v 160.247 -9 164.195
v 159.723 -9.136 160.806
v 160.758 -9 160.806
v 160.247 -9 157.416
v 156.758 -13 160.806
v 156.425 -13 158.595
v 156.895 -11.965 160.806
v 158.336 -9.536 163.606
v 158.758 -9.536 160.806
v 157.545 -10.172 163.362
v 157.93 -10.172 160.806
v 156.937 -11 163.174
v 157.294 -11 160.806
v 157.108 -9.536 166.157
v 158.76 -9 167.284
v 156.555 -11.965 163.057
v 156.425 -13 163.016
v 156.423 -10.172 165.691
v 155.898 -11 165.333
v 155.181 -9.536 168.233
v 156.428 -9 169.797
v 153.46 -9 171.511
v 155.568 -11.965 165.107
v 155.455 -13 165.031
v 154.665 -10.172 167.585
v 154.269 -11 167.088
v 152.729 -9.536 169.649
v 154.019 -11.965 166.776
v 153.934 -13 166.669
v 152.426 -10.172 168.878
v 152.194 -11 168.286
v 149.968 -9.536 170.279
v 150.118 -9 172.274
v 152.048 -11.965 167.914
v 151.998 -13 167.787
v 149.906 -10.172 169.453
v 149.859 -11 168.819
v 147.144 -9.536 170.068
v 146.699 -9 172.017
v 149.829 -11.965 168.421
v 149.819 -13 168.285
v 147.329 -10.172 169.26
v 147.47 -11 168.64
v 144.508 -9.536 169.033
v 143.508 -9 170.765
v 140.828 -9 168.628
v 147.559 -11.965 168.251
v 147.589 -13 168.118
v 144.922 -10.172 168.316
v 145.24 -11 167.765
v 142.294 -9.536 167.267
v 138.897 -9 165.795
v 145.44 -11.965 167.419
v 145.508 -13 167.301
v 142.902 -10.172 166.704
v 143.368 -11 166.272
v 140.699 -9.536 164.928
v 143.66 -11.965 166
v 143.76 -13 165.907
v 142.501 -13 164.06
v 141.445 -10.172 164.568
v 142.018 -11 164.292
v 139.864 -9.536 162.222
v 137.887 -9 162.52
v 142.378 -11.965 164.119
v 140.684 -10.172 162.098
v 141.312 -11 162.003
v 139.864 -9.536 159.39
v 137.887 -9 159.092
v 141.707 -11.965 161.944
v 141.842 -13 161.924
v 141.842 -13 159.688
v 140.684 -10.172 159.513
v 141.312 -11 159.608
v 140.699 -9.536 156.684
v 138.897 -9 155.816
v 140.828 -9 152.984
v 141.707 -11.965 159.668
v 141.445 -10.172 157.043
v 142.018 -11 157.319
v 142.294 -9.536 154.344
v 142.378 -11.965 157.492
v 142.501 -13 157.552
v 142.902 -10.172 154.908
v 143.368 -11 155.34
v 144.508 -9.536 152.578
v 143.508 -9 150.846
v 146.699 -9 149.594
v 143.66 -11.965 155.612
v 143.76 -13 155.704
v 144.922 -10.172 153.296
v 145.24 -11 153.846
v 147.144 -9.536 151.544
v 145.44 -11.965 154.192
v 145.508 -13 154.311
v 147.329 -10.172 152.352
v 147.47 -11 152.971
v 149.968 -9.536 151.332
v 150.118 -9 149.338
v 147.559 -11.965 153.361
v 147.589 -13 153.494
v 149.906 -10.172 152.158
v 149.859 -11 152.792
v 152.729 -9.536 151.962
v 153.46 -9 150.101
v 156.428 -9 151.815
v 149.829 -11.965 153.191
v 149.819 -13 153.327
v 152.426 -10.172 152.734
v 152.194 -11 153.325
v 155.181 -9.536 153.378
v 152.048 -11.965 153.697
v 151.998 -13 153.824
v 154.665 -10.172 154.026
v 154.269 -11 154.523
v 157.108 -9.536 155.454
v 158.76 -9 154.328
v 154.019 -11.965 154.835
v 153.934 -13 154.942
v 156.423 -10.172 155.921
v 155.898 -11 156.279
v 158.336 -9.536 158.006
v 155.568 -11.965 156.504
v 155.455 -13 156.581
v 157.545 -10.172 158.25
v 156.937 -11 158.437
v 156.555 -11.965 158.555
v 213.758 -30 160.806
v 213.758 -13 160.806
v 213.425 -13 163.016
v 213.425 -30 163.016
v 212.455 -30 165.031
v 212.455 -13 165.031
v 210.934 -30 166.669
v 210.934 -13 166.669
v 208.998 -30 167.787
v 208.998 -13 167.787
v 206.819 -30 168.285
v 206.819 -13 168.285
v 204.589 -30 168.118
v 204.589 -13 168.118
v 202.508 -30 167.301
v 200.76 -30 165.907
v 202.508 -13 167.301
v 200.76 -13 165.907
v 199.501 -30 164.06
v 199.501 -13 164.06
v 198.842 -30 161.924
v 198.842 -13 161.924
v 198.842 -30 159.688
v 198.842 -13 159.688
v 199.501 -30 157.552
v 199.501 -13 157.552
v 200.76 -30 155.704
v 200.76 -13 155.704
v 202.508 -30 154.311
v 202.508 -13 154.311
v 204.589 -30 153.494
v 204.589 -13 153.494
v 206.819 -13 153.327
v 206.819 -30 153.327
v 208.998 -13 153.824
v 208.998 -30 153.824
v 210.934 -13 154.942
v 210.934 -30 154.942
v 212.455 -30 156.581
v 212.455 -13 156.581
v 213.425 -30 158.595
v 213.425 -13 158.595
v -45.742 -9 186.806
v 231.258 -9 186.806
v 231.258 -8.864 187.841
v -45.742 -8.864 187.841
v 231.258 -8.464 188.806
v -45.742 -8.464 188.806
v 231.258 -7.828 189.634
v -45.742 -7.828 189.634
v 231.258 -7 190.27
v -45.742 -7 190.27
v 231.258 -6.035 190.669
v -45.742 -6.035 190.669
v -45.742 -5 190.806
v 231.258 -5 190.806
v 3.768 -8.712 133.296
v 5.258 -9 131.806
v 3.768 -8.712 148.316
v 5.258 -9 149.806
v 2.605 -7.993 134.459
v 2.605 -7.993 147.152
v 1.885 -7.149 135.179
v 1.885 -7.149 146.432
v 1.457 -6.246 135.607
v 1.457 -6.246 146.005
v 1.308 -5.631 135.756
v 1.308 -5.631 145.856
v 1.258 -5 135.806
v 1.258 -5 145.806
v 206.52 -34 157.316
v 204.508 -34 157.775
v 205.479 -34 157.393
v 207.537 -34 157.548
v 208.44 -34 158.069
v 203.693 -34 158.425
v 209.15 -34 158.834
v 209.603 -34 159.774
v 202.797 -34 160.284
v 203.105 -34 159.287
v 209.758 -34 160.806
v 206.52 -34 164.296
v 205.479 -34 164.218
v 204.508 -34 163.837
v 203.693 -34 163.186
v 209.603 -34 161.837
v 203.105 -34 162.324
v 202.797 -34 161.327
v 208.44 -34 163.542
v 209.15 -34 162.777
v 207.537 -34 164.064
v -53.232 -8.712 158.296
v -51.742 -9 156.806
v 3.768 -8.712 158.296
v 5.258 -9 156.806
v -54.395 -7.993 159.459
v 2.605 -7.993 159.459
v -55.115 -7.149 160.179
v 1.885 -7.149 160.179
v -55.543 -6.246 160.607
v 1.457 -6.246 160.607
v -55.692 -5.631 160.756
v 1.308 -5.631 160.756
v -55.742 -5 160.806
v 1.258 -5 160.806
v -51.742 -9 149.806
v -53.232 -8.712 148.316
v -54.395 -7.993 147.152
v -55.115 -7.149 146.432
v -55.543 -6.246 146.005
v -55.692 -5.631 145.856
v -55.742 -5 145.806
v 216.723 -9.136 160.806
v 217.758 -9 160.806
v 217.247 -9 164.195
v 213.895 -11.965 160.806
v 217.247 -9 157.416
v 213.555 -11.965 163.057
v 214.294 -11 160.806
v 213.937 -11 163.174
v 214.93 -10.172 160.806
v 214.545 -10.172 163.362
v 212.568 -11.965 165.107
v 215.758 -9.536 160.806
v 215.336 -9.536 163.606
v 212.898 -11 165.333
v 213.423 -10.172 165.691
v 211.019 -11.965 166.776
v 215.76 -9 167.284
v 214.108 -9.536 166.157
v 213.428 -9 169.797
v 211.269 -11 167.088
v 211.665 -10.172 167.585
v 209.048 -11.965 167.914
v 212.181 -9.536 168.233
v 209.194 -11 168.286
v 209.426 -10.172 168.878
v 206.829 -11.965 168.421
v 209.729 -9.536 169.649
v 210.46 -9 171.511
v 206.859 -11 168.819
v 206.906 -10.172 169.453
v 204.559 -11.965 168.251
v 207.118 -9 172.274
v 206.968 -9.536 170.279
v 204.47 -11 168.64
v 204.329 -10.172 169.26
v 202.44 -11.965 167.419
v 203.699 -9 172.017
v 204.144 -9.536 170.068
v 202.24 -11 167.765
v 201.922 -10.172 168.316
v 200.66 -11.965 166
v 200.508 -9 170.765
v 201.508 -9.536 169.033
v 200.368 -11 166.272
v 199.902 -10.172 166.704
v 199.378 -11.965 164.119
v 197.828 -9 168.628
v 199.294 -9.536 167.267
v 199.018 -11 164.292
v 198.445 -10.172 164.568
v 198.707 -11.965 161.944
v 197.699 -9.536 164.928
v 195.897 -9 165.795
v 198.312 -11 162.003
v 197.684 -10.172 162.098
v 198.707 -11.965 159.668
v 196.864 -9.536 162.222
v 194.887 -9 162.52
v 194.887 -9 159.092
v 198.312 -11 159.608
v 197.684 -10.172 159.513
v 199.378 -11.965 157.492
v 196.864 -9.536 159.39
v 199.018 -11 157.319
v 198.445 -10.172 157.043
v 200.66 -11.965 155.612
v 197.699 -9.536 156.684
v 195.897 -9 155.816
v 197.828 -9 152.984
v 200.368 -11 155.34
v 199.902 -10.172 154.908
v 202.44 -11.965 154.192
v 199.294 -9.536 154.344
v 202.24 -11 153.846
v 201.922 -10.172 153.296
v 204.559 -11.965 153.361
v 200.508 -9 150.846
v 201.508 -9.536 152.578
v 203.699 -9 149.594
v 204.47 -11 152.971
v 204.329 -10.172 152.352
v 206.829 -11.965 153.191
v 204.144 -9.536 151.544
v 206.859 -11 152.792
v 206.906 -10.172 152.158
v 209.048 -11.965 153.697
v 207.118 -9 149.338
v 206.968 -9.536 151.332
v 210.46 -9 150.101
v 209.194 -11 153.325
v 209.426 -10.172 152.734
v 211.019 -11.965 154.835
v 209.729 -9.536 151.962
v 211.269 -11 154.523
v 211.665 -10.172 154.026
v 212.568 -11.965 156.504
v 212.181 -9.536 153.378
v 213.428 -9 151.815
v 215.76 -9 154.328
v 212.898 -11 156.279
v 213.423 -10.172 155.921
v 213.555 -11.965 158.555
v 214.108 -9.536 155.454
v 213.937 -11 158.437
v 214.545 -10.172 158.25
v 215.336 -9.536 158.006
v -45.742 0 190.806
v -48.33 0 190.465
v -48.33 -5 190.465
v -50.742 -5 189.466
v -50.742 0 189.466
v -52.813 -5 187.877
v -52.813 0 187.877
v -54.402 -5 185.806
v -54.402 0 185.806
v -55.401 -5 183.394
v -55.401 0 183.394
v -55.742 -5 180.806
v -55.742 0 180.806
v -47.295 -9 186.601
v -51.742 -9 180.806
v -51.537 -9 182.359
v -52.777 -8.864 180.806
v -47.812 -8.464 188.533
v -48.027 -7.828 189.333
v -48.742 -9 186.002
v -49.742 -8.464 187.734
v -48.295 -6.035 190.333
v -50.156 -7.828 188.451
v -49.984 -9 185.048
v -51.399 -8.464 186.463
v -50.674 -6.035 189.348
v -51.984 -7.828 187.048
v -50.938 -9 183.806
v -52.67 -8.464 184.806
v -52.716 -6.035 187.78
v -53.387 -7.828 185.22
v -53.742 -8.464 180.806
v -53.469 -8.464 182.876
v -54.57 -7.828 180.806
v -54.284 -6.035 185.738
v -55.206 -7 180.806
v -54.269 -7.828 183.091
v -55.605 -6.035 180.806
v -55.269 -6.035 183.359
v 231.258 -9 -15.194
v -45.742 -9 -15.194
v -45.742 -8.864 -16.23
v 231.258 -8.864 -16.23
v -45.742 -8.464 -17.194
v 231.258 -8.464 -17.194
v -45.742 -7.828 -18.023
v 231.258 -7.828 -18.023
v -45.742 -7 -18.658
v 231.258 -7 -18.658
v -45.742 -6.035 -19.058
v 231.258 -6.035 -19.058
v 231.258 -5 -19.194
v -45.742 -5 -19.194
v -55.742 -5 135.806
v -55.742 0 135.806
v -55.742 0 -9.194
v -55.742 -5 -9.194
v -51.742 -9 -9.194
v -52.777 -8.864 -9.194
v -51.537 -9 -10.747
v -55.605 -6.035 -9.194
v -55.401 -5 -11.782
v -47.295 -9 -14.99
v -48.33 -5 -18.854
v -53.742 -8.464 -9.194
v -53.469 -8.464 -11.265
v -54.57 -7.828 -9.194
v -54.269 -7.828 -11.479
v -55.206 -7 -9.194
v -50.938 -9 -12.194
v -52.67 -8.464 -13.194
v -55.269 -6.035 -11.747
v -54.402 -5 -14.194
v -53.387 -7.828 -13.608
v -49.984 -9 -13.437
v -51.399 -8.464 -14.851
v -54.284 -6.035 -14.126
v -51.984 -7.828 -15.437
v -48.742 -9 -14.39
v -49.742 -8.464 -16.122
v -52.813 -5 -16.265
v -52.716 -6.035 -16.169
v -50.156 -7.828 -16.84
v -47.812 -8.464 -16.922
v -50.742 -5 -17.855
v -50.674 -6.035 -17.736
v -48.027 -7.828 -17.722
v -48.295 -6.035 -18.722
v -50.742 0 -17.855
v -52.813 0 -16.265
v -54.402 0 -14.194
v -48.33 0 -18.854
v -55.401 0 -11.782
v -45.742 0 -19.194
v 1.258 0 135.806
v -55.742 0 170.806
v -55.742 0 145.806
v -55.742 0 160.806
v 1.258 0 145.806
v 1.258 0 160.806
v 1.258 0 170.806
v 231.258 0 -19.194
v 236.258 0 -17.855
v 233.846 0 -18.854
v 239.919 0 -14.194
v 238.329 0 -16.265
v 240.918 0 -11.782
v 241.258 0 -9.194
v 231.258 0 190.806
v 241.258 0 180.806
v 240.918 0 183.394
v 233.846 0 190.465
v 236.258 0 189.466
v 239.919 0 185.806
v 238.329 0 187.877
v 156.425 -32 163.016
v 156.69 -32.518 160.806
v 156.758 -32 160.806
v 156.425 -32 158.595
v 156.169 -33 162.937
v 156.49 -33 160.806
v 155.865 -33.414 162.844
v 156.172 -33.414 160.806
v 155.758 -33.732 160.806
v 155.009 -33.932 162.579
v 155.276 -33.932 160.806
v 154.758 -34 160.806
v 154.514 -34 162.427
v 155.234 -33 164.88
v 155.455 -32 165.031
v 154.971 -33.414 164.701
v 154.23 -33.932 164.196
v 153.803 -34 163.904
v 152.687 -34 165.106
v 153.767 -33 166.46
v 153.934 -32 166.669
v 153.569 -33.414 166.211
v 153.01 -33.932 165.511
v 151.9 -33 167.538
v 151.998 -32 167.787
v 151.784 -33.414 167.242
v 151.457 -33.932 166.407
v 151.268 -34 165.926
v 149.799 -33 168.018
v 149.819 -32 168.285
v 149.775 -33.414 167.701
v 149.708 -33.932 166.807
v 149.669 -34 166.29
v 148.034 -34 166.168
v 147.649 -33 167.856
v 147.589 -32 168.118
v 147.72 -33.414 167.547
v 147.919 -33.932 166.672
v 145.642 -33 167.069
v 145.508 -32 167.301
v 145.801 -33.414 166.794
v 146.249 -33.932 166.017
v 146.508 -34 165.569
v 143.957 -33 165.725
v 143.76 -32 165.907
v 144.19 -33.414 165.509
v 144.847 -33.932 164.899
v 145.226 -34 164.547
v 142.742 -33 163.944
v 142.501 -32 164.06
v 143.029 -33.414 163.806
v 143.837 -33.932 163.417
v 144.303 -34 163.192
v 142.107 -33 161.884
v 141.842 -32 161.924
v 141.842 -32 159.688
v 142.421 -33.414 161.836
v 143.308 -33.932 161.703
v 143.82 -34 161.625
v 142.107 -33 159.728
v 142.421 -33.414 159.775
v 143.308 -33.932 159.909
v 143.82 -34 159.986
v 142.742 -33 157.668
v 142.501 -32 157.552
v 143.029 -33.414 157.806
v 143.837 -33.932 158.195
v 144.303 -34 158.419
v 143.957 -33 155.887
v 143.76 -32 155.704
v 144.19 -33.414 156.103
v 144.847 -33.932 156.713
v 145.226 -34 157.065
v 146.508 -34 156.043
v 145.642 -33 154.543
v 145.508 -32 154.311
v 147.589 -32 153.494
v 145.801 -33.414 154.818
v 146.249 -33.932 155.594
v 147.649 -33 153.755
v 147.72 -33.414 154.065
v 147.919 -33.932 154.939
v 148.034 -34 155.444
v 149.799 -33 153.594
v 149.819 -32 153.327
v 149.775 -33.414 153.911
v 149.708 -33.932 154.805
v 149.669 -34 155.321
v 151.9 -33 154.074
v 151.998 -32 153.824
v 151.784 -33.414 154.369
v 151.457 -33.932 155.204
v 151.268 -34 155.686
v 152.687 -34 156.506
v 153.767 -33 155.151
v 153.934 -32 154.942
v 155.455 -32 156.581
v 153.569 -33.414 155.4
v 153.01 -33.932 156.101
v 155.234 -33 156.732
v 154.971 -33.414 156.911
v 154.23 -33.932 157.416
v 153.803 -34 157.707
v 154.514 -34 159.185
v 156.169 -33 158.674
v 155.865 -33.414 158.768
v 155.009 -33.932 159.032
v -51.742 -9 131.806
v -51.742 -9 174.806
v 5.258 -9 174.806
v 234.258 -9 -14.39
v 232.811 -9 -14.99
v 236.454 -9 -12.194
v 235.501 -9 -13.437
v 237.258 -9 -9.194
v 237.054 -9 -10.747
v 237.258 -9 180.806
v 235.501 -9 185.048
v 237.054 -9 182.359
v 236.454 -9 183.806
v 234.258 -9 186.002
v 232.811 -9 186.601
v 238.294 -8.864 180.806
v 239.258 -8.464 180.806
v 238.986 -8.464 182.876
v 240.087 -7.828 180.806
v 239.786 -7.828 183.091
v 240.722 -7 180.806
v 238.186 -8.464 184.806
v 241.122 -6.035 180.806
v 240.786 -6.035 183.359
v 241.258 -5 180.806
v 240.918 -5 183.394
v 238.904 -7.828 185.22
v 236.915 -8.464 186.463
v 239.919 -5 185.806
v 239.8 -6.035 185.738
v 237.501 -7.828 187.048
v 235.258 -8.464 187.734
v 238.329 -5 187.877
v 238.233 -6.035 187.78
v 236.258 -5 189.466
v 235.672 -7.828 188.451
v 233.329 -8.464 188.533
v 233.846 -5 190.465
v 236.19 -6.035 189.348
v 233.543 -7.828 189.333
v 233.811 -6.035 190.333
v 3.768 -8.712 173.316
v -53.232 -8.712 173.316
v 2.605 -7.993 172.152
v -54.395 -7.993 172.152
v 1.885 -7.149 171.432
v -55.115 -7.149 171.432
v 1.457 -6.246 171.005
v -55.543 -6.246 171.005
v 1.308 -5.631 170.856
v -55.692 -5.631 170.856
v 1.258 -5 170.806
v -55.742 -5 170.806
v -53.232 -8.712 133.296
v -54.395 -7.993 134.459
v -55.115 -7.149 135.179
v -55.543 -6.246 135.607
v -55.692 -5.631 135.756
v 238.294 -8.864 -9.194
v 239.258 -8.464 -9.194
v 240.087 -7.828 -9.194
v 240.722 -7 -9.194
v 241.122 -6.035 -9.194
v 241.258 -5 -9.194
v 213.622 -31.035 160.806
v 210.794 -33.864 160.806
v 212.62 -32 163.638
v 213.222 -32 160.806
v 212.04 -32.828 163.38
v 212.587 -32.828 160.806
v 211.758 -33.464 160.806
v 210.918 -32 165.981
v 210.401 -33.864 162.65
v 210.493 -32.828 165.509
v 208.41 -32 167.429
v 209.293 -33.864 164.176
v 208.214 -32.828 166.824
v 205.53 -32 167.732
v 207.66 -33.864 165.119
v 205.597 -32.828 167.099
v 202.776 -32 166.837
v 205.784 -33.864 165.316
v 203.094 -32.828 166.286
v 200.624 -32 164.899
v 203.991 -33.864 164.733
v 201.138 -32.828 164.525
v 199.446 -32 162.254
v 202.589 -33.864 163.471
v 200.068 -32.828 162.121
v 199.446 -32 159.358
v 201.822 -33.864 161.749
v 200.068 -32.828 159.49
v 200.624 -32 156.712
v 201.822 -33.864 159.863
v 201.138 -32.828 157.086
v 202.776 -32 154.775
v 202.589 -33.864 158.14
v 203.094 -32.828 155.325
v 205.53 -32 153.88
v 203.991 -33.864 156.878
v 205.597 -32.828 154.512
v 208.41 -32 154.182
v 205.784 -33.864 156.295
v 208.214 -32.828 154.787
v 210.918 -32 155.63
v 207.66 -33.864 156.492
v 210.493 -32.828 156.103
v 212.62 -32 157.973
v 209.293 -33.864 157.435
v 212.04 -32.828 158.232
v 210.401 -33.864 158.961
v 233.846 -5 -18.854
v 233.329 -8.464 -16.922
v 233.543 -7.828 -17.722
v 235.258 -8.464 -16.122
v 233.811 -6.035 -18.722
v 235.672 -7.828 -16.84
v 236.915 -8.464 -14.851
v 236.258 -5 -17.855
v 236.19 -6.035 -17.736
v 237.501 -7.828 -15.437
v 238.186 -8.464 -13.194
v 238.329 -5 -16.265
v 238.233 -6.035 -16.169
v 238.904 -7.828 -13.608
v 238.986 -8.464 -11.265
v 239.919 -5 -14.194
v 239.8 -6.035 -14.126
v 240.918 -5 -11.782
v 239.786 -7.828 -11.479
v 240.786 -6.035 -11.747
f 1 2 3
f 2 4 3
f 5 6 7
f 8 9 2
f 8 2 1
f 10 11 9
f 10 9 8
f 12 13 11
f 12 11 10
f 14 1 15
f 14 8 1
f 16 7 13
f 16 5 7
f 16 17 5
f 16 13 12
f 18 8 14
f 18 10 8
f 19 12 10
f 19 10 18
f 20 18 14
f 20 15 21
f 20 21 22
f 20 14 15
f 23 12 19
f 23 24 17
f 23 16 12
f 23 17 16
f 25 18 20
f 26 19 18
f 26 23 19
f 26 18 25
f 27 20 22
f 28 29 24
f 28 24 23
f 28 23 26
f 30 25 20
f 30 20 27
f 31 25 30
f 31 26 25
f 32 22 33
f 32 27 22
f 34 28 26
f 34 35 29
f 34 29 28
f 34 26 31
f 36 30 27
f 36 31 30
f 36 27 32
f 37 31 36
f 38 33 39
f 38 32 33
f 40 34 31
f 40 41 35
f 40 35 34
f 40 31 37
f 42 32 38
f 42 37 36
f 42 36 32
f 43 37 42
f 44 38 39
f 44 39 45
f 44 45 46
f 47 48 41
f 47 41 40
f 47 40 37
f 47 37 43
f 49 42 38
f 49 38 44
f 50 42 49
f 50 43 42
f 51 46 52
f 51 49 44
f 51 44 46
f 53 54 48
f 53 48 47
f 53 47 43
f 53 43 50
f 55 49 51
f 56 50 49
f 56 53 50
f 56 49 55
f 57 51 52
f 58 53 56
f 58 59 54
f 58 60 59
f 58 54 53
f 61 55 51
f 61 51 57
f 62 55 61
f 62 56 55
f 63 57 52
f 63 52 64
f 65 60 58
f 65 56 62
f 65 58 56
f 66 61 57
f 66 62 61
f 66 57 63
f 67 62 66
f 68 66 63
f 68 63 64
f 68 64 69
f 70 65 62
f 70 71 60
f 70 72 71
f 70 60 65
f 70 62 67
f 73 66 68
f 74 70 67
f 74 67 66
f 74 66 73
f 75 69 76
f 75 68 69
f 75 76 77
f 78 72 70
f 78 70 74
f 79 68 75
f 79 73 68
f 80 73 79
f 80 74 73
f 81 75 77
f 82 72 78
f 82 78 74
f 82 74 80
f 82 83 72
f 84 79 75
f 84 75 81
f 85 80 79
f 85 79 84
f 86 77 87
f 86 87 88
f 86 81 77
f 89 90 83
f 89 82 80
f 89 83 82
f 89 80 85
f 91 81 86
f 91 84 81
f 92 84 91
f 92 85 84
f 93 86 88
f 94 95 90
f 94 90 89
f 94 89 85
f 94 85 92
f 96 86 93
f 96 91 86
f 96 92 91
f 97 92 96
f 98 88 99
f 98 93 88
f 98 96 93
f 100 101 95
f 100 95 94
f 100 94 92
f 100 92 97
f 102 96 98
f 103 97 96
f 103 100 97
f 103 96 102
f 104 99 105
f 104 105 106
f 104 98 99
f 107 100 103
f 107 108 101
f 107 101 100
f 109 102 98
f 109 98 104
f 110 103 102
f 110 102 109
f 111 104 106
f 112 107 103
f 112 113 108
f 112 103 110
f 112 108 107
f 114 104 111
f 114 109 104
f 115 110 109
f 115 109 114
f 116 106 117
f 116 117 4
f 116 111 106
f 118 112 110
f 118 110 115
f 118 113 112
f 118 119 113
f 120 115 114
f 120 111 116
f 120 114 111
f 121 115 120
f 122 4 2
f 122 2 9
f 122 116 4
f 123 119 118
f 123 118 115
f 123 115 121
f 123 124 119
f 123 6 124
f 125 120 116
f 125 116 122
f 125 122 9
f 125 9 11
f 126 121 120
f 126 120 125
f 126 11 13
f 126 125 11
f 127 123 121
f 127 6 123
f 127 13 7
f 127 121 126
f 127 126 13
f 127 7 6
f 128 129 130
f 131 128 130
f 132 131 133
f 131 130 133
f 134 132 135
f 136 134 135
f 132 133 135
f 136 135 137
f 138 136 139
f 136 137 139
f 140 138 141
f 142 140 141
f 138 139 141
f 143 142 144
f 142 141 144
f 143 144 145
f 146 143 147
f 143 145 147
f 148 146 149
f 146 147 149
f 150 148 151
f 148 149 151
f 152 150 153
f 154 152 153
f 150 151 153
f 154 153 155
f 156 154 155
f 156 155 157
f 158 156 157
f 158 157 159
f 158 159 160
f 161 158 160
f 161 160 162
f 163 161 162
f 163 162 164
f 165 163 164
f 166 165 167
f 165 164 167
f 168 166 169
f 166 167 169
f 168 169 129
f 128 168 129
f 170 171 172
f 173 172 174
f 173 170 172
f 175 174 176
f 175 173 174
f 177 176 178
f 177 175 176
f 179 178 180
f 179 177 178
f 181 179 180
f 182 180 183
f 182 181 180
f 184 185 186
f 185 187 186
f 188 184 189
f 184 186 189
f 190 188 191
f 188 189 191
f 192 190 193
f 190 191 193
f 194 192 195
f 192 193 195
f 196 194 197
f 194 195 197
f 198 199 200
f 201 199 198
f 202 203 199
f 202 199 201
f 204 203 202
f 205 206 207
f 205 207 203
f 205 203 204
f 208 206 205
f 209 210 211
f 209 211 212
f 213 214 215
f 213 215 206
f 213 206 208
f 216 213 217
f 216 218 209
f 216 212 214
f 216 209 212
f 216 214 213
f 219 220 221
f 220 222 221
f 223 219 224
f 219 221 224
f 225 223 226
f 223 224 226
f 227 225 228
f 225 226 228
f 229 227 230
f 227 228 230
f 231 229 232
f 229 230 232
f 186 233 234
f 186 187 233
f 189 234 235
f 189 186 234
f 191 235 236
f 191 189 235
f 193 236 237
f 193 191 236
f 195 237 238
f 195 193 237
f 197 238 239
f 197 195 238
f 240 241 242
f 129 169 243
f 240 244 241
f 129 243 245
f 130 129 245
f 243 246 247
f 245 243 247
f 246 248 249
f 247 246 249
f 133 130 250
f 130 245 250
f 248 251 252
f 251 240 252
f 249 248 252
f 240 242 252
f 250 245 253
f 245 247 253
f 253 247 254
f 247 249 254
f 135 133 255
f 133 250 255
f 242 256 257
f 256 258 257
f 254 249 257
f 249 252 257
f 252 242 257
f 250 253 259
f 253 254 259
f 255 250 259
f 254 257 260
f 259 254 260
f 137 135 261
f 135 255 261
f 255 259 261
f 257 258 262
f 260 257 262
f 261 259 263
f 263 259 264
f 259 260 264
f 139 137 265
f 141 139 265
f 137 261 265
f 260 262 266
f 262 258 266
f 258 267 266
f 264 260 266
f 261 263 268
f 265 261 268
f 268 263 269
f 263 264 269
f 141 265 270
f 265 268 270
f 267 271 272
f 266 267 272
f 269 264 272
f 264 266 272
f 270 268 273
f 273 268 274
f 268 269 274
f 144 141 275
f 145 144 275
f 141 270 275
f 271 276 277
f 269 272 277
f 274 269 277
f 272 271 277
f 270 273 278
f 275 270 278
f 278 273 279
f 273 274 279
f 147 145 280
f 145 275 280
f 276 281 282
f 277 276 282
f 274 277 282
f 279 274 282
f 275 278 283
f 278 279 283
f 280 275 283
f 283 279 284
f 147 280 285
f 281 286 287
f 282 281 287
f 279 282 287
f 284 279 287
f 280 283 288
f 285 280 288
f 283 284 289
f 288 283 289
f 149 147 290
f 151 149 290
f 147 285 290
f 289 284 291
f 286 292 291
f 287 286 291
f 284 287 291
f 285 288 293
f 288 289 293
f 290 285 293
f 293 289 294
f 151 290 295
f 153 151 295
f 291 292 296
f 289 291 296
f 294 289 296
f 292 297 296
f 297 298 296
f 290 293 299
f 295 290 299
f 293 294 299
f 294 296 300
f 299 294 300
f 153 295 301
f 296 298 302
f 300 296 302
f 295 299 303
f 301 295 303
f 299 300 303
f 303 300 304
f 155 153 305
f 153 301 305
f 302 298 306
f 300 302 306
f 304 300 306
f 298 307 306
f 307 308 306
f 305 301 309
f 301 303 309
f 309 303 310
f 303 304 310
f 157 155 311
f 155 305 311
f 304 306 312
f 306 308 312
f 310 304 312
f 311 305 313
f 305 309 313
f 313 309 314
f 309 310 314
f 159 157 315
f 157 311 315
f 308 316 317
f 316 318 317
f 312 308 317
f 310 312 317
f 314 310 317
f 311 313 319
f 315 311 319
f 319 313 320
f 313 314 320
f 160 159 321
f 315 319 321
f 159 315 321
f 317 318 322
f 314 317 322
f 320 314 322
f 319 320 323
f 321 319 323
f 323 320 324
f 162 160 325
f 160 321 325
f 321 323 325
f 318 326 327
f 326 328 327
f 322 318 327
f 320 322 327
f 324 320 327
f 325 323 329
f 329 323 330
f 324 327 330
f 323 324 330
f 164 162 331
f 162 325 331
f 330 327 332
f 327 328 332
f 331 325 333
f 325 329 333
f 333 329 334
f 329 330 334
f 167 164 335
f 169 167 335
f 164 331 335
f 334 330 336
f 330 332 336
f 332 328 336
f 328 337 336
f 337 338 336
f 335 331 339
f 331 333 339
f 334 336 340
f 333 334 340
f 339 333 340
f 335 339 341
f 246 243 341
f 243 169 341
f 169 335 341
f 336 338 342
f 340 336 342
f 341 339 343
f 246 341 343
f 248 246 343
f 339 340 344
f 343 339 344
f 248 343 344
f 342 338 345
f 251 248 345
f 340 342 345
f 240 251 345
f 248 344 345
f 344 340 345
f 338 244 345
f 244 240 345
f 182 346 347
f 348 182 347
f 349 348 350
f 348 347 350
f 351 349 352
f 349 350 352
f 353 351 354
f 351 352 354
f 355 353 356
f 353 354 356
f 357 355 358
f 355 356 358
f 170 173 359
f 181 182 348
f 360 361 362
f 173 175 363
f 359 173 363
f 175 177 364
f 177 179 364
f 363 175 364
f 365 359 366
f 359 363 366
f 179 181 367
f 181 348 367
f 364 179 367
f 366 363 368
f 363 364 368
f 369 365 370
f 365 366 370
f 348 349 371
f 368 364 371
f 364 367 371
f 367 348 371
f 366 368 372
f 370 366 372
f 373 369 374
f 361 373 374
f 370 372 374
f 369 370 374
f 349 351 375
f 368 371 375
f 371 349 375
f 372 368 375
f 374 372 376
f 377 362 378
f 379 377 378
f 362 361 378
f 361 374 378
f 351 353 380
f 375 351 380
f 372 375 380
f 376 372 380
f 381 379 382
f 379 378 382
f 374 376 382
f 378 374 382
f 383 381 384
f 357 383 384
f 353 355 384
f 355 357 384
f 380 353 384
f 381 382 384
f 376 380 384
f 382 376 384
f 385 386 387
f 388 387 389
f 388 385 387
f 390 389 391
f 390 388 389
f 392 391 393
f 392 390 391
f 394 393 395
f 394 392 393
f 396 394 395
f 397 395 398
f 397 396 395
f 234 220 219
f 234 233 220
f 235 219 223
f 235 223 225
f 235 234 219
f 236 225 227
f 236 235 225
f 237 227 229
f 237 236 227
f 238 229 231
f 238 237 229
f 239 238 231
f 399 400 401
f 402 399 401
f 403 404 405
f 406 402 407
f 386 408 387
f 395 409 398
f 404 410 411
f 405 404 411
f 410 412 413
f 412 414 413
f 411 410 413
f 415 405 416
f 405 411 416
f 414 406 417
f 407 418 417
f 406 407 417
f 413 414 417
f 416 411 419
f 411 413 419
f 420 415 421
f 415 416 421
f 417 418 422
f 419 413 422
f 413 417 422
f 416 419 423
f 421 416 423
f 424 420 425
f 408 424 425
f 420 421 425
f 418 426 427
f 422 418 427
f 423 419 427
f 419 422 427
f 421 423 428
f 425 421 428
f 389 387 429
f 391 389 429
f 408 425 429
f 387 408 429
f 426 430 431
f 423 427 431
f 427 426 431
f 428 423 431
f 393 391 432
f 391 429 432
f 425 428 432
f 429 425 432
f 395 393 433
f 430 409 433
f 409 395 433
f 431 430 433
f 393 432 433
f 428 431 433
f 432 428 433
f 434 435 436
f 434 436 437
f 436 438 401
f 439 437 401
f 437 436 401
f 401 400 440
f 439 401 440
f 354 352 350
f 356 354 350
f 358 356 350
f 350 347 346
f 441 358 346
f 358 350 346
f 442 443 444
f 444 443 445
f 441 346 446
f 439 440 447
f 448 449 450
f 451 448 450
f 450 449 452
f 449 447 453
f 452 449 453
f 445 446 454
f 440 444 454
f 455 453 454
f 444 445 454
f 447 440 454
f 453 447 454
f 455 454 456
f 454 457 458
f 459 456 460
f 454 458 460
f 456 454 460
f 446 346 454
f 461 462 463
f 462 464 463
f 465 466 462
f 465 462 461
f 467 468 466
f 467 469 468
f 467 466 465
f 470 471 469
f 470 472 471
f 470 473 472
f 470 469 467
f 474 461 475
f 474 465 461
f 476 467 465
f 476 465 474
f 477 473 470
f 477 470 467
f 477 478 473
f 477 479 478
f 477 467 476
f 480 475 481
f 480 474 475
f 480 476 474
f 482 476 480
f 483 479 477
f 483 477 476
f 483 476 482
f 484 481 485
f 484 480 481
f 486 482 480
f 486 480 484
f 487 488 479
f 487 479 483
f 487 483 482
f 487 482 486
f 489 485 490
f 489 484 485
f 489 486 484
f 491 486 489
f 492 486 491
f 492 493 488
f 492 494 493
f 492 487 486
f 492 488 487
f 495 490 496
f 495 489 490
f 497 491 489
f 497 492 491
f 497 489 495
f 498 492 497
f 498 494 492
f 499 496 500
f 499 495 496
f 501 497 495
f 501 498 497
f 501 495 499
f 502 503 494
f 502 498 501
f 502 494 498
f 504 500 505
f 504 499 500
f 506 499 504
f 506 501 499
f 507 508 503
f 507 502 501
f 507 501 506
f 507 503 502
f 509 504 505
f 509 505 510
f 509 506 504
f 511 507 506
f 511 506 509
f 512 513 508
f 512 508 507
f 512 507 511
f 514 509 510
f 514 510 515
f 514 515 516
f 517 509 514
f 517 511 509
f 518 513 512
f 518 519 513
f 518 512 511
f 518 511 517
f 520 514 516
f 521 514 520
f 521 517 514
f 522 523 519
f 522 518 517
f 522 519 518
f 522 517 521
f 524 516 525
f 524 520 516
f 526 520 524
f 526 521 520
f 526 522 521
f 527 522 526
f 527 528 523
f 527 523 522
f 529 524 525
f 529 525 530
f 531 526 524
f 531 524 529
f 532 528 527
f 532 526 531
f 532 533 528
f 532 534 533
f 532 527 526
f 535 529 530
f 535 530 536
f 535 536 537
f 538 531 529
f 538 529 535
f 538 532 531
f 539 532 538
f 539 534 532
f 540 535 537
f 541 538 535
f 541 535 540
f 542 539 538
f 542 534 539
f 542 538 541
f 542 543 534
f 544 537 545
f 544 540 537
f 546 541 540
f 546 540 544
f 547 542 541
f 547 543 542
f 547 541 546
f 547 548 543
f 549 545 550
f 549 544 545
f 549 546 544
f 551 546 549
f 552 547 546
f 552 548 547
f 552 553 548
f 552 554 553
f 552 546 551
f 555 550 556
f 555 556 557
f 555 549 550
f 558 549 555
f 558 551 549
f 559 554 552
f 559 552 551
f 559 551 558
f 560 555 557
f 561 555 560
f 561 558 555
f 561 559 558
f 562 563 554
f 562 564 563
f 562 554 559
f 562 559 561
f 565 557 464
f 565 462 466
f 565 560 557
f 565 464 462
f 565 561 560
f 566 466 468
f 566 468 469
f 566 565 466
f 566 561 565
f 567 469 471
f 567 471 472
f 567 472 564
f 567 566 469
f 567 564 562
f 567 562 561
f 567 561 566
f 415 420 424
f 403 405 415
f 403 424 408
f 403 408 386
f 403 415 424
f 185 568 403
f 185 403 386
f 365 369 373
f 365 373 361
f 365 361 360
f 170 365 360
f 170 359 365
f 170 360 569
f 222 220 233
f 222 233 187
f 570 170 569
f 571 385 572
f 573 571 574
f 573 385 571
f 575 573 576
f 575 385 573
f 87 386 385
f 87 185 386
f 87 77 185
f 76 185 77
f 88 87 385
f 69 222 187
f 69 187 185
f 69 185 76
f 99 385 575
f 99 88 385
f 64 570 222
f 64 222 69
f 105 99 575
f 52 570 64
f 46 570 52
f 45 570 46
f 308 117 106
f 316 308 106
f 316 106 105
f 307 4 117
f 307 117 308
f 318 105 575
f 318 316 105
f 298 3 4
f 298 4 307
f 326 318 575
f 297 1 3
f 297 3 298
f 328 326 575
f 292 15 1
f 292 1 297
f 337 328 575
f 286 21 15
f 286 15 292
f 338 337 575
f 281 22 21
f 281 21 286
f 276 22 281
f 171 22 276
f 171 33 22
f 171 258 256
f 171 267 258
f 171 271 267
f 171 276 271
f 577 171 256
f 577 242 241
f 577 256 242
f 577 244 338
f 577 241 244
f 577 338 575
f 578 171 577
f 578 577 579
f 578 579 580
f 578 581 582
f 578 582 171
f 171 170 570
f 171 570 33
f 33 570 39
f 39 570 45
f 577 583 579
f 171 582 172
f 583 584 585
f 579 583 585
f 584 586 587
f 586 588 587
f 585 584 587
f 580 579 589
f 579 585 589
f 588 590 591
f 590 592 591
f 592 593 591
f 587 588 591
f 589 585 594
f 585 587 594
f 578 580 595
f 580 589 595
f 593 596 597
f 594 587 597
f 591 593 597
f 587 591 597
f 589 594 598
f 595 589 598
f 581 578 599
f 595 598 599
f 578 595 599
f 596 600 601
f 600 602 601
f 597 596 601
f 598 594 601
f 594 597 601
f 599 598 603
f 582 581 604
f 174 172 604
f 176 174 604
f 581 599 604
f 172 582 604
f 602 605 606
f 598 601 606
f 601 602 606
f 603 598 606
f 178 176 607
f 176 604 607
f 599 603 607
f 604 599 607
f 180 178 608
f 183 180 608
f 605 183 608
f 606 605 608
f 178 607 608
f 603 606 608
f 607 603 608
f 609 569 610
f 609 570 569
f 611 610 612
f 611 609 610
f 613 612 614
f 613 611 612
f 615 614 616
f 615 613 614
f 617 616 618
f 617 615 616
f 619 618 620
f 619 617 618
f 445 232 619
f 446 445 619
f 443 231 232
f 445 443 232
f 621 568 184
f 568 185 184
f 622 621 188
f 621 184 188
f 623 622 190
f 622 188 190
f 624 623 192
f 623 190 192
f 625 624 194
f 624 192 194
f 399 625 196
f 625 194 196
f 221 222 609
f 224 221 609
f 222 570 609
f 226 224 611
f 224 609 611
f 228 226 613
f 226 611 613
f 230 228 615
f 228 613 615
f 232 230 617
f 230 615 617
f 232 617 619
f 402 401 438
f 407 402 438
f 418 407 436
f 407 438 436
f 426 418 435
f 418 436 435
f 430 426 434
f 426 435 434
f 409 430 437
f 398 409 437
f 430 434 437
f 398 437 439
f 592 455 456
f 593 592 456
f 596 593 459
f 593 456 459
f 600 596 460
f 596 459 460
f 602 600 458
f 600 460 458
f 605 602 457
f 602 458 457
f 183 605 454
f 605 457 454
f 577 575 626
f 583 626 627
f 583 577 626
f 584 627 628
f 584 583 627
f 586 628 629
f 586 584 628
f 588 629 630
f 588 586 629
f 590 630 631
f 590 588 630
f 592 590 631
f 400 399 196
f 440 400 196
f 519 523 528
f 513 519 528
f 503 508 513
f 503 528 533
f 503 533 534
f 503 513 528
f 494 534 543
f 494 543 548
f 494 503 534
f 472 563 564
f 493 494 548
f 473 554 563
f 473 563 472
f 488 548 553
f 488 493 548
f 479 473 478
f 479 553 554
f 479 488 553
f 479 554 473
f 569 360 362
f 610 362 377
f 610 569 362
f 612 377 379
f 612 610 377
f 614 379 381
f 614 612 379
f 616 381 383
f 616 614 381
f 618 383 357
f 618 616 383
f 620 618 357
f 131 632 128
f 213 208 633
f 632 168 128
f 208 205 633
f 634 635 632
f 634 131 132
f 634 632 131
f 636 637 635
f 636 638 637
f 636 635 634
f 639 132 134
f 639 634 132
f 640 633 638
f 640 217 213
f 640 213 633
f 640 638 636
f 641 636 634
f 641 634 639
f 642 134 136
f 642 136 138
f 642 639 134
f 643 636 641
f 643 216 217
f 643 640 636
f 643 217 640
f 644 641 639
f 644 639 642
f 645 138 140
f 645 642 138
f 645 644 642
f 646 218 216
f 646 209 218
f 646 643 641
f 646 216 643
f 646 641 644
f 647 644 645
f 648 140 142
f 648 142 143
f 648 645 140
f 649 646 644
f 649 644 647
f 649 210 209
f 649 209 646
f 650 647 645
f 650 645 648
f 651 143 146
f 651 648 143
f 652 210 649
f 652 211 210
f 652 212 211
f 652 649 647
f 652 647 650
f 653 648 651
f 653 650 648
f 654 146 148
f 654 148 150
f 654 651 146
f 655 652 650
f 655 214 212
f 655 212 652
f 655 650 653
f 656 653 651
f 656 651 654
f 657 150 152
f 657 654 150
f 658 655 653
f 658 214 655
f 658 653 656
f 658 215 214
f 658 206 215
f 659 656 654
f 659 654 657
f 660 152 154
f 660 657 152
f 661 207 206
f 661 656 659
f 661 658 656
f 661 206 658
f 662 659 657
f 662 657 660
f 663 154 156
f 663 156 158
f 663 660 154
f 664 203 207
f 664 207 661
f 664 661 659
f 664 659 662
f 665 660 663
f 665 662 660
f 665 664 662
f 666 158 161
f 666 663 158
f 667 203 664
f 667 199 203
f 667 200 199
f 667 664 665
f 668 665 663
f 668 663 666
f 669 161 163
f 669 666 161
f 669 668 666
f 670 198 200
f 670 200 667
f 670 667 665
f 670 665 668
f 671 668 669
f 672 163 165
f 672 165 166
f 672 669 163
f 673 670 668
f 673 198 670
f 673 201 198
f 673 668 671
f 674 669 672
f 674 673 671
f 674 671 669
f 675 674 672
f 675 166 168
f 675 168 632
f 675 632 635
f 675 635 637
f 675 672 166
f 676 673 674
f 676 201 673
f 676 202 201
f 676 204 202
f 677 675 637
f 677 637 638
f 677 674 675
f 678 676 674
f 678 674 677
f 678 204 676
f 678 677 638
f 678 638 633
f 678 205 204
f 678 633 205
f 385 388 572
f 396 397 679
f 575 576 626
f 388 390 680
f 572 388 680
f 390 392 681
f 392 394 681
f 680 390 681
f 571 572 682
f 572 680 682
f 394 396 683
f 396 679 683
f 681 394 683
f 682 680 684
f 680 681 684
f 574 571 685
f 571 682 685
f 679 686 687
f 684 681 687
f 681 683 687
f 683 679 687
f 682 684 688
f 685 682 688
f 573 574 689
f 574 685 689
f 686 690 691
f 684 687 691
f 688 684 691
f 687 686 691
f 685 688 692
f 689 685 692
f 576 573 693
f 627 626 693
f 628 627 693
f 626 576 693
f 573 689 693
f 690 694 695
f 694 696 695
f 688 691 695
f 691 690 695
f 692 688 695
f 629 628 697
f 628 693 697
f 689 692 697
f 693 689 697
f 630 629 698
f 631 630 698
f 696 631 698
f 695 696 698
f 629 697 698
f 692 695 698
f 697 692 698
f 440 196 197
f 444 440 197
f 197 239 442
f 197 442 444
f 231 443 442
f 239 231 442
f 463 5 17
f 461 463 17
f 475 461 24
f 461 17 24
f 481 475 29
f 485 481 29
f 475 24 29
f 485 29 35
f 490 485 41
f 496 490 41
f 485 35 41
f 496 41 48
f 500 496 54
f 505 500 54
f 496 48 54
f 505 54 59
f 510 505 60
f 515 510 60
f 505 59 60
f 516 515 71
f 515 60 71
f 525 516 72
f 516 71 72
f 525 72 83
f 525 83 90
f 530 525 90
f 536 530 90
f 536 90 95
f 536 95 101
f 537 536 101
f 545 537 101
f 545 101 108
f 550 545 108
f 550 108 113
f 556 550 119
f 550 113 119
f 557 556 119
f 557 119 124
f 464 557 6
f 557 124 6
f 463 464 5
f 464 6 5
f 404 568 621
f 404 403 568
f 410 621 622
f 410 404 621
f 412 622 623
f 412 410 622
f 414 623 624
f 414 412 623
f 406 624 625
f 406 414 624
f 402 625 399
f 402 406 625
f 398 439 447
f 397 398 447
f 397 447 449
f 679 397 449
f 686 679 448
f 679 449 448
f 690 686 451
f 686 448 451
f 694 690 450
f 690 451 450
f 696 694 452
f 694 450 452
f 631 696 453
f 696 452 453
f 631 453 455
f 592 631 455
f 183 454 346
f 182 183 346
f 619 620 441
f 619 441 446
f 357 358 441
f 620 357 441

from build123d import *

# Parameters (mm, degrees)
F1_DEPTH = 9
F2_R     = 7.5
F3_DEPTH = 25
F4_W     = 57
F4_H     = 10
F5_DEPTH = 25
F6_R     = 2
F7_R     = 4
F8_R     = 4


with BuildPart() as f1:
    # F0 (on Front) → F1 (new body)
    with BuildSketch(Plane.XZ):
        with BuildLine():
            Line((231.2582800984, 190.805722177), (-45.7417199016, 190.805722177))
            ThreePointArc((-45.7417199016, 190.805722177), (-52.8127877134, 187.8767899889), (-55.7417199016, 180.805722177))
            Line((-55.7417199016, 180.805722177), (-55.7417199016, -9.194277823))
            ThreePointArc((-55.7417199016, -9.194277823), (-52.8127877134, -16.2653456348), (-45.7417199016, -19.194277823))
            Line((-45.7417199016, -19.194277823), (231.2582800984, -19.194277823))
            ThreePointArc((231.2582800984, -19.194277823), (238.3293479103, -16.2653456348), (241.2582800984, -9.194277823))
            Line((241.2582800984, -9.194277823), (241.2582800984, 180.805722177))
            ThreePointArc((241.2582800984, 180.805722177), (238.3293479103, 187.8767899889), (231.2582800984, 190.805722177))
        make_face()
    extrude(amount=F1_DEPTH)

    # F2 (on face) → F3 (join)
    with BuildSketch(Plane.XZ.offset(9)):
        with Locations((149.2582800984, 160.805722177)):
            Circle(F2_R)
        with Locations((206.2582800984, 160.805722177)):
            Circle(F2_R)
    extrude(amount=F3_DEPTH)

    # F4 (on face) → F5 (cut)
    with BuildSketch(Plane.XZ.offset(9)):
        with Locations((-27.2417199016, 165.805722177)):
            Rectangle(F4_W, F4_H)
        with Locations((-27.2417199016, 140.805722177)):
            Rectangle(F4_W, F4_H)
    extrude(amount=-F5_DEPTH, mode=Mode.SUBTRACT)

    # F6
    f6_edges = [f1.edges().sort_by_distance(p)[0] for p in [
        (141.75828, -34, 160.805722),
    ]]
    fillet(f6_edges, radius=F6_R)

    # F7
    f7_edges = [f1.edges().sort_by_distance(p)[0] for p in [
        (198.75828, -34, 160.805722),
    ]]
    fillet(f7_edges, radius=F7_R)

    # F8
    f8_edges = [f1.edges().sort_by_distance(p)[0] for p in [
        (143.75828, -34, 160.805722),
        (141.75828, -32, 160.805722),
        (238.329348, -9, 187.87679),
        (241.25828, -9, 85.805722),
        (238.329348, -9, -16.265346),
        (92.75828, -9, -19.194278),
        (-52.812788, -9, -16.265346),
        (-55.74172, -9, 63.305722),
        (-27.24172, -9, 135.805722),
        (1.25828, -9, 140.805722),
        (-27.24172, -9, 145.805722),
        (-55.74172, -9, 153.305722),
        (-27.24172, -9, 160.805722),
        (1.25828, -9, 165.805722),
        (-27.24172, -9, 170.805722),
        (-55.74172, -9, 175.805722),
        (-52.812788, -9, 187.87679),
        (92.75828, -9, 190.805722),
        (141.75828, -9, 160.805722),
        (198.75828, -9, 160.805722),
    ]]
    fillet(f8_edges, radius=F8_R)


solid = f1.part
